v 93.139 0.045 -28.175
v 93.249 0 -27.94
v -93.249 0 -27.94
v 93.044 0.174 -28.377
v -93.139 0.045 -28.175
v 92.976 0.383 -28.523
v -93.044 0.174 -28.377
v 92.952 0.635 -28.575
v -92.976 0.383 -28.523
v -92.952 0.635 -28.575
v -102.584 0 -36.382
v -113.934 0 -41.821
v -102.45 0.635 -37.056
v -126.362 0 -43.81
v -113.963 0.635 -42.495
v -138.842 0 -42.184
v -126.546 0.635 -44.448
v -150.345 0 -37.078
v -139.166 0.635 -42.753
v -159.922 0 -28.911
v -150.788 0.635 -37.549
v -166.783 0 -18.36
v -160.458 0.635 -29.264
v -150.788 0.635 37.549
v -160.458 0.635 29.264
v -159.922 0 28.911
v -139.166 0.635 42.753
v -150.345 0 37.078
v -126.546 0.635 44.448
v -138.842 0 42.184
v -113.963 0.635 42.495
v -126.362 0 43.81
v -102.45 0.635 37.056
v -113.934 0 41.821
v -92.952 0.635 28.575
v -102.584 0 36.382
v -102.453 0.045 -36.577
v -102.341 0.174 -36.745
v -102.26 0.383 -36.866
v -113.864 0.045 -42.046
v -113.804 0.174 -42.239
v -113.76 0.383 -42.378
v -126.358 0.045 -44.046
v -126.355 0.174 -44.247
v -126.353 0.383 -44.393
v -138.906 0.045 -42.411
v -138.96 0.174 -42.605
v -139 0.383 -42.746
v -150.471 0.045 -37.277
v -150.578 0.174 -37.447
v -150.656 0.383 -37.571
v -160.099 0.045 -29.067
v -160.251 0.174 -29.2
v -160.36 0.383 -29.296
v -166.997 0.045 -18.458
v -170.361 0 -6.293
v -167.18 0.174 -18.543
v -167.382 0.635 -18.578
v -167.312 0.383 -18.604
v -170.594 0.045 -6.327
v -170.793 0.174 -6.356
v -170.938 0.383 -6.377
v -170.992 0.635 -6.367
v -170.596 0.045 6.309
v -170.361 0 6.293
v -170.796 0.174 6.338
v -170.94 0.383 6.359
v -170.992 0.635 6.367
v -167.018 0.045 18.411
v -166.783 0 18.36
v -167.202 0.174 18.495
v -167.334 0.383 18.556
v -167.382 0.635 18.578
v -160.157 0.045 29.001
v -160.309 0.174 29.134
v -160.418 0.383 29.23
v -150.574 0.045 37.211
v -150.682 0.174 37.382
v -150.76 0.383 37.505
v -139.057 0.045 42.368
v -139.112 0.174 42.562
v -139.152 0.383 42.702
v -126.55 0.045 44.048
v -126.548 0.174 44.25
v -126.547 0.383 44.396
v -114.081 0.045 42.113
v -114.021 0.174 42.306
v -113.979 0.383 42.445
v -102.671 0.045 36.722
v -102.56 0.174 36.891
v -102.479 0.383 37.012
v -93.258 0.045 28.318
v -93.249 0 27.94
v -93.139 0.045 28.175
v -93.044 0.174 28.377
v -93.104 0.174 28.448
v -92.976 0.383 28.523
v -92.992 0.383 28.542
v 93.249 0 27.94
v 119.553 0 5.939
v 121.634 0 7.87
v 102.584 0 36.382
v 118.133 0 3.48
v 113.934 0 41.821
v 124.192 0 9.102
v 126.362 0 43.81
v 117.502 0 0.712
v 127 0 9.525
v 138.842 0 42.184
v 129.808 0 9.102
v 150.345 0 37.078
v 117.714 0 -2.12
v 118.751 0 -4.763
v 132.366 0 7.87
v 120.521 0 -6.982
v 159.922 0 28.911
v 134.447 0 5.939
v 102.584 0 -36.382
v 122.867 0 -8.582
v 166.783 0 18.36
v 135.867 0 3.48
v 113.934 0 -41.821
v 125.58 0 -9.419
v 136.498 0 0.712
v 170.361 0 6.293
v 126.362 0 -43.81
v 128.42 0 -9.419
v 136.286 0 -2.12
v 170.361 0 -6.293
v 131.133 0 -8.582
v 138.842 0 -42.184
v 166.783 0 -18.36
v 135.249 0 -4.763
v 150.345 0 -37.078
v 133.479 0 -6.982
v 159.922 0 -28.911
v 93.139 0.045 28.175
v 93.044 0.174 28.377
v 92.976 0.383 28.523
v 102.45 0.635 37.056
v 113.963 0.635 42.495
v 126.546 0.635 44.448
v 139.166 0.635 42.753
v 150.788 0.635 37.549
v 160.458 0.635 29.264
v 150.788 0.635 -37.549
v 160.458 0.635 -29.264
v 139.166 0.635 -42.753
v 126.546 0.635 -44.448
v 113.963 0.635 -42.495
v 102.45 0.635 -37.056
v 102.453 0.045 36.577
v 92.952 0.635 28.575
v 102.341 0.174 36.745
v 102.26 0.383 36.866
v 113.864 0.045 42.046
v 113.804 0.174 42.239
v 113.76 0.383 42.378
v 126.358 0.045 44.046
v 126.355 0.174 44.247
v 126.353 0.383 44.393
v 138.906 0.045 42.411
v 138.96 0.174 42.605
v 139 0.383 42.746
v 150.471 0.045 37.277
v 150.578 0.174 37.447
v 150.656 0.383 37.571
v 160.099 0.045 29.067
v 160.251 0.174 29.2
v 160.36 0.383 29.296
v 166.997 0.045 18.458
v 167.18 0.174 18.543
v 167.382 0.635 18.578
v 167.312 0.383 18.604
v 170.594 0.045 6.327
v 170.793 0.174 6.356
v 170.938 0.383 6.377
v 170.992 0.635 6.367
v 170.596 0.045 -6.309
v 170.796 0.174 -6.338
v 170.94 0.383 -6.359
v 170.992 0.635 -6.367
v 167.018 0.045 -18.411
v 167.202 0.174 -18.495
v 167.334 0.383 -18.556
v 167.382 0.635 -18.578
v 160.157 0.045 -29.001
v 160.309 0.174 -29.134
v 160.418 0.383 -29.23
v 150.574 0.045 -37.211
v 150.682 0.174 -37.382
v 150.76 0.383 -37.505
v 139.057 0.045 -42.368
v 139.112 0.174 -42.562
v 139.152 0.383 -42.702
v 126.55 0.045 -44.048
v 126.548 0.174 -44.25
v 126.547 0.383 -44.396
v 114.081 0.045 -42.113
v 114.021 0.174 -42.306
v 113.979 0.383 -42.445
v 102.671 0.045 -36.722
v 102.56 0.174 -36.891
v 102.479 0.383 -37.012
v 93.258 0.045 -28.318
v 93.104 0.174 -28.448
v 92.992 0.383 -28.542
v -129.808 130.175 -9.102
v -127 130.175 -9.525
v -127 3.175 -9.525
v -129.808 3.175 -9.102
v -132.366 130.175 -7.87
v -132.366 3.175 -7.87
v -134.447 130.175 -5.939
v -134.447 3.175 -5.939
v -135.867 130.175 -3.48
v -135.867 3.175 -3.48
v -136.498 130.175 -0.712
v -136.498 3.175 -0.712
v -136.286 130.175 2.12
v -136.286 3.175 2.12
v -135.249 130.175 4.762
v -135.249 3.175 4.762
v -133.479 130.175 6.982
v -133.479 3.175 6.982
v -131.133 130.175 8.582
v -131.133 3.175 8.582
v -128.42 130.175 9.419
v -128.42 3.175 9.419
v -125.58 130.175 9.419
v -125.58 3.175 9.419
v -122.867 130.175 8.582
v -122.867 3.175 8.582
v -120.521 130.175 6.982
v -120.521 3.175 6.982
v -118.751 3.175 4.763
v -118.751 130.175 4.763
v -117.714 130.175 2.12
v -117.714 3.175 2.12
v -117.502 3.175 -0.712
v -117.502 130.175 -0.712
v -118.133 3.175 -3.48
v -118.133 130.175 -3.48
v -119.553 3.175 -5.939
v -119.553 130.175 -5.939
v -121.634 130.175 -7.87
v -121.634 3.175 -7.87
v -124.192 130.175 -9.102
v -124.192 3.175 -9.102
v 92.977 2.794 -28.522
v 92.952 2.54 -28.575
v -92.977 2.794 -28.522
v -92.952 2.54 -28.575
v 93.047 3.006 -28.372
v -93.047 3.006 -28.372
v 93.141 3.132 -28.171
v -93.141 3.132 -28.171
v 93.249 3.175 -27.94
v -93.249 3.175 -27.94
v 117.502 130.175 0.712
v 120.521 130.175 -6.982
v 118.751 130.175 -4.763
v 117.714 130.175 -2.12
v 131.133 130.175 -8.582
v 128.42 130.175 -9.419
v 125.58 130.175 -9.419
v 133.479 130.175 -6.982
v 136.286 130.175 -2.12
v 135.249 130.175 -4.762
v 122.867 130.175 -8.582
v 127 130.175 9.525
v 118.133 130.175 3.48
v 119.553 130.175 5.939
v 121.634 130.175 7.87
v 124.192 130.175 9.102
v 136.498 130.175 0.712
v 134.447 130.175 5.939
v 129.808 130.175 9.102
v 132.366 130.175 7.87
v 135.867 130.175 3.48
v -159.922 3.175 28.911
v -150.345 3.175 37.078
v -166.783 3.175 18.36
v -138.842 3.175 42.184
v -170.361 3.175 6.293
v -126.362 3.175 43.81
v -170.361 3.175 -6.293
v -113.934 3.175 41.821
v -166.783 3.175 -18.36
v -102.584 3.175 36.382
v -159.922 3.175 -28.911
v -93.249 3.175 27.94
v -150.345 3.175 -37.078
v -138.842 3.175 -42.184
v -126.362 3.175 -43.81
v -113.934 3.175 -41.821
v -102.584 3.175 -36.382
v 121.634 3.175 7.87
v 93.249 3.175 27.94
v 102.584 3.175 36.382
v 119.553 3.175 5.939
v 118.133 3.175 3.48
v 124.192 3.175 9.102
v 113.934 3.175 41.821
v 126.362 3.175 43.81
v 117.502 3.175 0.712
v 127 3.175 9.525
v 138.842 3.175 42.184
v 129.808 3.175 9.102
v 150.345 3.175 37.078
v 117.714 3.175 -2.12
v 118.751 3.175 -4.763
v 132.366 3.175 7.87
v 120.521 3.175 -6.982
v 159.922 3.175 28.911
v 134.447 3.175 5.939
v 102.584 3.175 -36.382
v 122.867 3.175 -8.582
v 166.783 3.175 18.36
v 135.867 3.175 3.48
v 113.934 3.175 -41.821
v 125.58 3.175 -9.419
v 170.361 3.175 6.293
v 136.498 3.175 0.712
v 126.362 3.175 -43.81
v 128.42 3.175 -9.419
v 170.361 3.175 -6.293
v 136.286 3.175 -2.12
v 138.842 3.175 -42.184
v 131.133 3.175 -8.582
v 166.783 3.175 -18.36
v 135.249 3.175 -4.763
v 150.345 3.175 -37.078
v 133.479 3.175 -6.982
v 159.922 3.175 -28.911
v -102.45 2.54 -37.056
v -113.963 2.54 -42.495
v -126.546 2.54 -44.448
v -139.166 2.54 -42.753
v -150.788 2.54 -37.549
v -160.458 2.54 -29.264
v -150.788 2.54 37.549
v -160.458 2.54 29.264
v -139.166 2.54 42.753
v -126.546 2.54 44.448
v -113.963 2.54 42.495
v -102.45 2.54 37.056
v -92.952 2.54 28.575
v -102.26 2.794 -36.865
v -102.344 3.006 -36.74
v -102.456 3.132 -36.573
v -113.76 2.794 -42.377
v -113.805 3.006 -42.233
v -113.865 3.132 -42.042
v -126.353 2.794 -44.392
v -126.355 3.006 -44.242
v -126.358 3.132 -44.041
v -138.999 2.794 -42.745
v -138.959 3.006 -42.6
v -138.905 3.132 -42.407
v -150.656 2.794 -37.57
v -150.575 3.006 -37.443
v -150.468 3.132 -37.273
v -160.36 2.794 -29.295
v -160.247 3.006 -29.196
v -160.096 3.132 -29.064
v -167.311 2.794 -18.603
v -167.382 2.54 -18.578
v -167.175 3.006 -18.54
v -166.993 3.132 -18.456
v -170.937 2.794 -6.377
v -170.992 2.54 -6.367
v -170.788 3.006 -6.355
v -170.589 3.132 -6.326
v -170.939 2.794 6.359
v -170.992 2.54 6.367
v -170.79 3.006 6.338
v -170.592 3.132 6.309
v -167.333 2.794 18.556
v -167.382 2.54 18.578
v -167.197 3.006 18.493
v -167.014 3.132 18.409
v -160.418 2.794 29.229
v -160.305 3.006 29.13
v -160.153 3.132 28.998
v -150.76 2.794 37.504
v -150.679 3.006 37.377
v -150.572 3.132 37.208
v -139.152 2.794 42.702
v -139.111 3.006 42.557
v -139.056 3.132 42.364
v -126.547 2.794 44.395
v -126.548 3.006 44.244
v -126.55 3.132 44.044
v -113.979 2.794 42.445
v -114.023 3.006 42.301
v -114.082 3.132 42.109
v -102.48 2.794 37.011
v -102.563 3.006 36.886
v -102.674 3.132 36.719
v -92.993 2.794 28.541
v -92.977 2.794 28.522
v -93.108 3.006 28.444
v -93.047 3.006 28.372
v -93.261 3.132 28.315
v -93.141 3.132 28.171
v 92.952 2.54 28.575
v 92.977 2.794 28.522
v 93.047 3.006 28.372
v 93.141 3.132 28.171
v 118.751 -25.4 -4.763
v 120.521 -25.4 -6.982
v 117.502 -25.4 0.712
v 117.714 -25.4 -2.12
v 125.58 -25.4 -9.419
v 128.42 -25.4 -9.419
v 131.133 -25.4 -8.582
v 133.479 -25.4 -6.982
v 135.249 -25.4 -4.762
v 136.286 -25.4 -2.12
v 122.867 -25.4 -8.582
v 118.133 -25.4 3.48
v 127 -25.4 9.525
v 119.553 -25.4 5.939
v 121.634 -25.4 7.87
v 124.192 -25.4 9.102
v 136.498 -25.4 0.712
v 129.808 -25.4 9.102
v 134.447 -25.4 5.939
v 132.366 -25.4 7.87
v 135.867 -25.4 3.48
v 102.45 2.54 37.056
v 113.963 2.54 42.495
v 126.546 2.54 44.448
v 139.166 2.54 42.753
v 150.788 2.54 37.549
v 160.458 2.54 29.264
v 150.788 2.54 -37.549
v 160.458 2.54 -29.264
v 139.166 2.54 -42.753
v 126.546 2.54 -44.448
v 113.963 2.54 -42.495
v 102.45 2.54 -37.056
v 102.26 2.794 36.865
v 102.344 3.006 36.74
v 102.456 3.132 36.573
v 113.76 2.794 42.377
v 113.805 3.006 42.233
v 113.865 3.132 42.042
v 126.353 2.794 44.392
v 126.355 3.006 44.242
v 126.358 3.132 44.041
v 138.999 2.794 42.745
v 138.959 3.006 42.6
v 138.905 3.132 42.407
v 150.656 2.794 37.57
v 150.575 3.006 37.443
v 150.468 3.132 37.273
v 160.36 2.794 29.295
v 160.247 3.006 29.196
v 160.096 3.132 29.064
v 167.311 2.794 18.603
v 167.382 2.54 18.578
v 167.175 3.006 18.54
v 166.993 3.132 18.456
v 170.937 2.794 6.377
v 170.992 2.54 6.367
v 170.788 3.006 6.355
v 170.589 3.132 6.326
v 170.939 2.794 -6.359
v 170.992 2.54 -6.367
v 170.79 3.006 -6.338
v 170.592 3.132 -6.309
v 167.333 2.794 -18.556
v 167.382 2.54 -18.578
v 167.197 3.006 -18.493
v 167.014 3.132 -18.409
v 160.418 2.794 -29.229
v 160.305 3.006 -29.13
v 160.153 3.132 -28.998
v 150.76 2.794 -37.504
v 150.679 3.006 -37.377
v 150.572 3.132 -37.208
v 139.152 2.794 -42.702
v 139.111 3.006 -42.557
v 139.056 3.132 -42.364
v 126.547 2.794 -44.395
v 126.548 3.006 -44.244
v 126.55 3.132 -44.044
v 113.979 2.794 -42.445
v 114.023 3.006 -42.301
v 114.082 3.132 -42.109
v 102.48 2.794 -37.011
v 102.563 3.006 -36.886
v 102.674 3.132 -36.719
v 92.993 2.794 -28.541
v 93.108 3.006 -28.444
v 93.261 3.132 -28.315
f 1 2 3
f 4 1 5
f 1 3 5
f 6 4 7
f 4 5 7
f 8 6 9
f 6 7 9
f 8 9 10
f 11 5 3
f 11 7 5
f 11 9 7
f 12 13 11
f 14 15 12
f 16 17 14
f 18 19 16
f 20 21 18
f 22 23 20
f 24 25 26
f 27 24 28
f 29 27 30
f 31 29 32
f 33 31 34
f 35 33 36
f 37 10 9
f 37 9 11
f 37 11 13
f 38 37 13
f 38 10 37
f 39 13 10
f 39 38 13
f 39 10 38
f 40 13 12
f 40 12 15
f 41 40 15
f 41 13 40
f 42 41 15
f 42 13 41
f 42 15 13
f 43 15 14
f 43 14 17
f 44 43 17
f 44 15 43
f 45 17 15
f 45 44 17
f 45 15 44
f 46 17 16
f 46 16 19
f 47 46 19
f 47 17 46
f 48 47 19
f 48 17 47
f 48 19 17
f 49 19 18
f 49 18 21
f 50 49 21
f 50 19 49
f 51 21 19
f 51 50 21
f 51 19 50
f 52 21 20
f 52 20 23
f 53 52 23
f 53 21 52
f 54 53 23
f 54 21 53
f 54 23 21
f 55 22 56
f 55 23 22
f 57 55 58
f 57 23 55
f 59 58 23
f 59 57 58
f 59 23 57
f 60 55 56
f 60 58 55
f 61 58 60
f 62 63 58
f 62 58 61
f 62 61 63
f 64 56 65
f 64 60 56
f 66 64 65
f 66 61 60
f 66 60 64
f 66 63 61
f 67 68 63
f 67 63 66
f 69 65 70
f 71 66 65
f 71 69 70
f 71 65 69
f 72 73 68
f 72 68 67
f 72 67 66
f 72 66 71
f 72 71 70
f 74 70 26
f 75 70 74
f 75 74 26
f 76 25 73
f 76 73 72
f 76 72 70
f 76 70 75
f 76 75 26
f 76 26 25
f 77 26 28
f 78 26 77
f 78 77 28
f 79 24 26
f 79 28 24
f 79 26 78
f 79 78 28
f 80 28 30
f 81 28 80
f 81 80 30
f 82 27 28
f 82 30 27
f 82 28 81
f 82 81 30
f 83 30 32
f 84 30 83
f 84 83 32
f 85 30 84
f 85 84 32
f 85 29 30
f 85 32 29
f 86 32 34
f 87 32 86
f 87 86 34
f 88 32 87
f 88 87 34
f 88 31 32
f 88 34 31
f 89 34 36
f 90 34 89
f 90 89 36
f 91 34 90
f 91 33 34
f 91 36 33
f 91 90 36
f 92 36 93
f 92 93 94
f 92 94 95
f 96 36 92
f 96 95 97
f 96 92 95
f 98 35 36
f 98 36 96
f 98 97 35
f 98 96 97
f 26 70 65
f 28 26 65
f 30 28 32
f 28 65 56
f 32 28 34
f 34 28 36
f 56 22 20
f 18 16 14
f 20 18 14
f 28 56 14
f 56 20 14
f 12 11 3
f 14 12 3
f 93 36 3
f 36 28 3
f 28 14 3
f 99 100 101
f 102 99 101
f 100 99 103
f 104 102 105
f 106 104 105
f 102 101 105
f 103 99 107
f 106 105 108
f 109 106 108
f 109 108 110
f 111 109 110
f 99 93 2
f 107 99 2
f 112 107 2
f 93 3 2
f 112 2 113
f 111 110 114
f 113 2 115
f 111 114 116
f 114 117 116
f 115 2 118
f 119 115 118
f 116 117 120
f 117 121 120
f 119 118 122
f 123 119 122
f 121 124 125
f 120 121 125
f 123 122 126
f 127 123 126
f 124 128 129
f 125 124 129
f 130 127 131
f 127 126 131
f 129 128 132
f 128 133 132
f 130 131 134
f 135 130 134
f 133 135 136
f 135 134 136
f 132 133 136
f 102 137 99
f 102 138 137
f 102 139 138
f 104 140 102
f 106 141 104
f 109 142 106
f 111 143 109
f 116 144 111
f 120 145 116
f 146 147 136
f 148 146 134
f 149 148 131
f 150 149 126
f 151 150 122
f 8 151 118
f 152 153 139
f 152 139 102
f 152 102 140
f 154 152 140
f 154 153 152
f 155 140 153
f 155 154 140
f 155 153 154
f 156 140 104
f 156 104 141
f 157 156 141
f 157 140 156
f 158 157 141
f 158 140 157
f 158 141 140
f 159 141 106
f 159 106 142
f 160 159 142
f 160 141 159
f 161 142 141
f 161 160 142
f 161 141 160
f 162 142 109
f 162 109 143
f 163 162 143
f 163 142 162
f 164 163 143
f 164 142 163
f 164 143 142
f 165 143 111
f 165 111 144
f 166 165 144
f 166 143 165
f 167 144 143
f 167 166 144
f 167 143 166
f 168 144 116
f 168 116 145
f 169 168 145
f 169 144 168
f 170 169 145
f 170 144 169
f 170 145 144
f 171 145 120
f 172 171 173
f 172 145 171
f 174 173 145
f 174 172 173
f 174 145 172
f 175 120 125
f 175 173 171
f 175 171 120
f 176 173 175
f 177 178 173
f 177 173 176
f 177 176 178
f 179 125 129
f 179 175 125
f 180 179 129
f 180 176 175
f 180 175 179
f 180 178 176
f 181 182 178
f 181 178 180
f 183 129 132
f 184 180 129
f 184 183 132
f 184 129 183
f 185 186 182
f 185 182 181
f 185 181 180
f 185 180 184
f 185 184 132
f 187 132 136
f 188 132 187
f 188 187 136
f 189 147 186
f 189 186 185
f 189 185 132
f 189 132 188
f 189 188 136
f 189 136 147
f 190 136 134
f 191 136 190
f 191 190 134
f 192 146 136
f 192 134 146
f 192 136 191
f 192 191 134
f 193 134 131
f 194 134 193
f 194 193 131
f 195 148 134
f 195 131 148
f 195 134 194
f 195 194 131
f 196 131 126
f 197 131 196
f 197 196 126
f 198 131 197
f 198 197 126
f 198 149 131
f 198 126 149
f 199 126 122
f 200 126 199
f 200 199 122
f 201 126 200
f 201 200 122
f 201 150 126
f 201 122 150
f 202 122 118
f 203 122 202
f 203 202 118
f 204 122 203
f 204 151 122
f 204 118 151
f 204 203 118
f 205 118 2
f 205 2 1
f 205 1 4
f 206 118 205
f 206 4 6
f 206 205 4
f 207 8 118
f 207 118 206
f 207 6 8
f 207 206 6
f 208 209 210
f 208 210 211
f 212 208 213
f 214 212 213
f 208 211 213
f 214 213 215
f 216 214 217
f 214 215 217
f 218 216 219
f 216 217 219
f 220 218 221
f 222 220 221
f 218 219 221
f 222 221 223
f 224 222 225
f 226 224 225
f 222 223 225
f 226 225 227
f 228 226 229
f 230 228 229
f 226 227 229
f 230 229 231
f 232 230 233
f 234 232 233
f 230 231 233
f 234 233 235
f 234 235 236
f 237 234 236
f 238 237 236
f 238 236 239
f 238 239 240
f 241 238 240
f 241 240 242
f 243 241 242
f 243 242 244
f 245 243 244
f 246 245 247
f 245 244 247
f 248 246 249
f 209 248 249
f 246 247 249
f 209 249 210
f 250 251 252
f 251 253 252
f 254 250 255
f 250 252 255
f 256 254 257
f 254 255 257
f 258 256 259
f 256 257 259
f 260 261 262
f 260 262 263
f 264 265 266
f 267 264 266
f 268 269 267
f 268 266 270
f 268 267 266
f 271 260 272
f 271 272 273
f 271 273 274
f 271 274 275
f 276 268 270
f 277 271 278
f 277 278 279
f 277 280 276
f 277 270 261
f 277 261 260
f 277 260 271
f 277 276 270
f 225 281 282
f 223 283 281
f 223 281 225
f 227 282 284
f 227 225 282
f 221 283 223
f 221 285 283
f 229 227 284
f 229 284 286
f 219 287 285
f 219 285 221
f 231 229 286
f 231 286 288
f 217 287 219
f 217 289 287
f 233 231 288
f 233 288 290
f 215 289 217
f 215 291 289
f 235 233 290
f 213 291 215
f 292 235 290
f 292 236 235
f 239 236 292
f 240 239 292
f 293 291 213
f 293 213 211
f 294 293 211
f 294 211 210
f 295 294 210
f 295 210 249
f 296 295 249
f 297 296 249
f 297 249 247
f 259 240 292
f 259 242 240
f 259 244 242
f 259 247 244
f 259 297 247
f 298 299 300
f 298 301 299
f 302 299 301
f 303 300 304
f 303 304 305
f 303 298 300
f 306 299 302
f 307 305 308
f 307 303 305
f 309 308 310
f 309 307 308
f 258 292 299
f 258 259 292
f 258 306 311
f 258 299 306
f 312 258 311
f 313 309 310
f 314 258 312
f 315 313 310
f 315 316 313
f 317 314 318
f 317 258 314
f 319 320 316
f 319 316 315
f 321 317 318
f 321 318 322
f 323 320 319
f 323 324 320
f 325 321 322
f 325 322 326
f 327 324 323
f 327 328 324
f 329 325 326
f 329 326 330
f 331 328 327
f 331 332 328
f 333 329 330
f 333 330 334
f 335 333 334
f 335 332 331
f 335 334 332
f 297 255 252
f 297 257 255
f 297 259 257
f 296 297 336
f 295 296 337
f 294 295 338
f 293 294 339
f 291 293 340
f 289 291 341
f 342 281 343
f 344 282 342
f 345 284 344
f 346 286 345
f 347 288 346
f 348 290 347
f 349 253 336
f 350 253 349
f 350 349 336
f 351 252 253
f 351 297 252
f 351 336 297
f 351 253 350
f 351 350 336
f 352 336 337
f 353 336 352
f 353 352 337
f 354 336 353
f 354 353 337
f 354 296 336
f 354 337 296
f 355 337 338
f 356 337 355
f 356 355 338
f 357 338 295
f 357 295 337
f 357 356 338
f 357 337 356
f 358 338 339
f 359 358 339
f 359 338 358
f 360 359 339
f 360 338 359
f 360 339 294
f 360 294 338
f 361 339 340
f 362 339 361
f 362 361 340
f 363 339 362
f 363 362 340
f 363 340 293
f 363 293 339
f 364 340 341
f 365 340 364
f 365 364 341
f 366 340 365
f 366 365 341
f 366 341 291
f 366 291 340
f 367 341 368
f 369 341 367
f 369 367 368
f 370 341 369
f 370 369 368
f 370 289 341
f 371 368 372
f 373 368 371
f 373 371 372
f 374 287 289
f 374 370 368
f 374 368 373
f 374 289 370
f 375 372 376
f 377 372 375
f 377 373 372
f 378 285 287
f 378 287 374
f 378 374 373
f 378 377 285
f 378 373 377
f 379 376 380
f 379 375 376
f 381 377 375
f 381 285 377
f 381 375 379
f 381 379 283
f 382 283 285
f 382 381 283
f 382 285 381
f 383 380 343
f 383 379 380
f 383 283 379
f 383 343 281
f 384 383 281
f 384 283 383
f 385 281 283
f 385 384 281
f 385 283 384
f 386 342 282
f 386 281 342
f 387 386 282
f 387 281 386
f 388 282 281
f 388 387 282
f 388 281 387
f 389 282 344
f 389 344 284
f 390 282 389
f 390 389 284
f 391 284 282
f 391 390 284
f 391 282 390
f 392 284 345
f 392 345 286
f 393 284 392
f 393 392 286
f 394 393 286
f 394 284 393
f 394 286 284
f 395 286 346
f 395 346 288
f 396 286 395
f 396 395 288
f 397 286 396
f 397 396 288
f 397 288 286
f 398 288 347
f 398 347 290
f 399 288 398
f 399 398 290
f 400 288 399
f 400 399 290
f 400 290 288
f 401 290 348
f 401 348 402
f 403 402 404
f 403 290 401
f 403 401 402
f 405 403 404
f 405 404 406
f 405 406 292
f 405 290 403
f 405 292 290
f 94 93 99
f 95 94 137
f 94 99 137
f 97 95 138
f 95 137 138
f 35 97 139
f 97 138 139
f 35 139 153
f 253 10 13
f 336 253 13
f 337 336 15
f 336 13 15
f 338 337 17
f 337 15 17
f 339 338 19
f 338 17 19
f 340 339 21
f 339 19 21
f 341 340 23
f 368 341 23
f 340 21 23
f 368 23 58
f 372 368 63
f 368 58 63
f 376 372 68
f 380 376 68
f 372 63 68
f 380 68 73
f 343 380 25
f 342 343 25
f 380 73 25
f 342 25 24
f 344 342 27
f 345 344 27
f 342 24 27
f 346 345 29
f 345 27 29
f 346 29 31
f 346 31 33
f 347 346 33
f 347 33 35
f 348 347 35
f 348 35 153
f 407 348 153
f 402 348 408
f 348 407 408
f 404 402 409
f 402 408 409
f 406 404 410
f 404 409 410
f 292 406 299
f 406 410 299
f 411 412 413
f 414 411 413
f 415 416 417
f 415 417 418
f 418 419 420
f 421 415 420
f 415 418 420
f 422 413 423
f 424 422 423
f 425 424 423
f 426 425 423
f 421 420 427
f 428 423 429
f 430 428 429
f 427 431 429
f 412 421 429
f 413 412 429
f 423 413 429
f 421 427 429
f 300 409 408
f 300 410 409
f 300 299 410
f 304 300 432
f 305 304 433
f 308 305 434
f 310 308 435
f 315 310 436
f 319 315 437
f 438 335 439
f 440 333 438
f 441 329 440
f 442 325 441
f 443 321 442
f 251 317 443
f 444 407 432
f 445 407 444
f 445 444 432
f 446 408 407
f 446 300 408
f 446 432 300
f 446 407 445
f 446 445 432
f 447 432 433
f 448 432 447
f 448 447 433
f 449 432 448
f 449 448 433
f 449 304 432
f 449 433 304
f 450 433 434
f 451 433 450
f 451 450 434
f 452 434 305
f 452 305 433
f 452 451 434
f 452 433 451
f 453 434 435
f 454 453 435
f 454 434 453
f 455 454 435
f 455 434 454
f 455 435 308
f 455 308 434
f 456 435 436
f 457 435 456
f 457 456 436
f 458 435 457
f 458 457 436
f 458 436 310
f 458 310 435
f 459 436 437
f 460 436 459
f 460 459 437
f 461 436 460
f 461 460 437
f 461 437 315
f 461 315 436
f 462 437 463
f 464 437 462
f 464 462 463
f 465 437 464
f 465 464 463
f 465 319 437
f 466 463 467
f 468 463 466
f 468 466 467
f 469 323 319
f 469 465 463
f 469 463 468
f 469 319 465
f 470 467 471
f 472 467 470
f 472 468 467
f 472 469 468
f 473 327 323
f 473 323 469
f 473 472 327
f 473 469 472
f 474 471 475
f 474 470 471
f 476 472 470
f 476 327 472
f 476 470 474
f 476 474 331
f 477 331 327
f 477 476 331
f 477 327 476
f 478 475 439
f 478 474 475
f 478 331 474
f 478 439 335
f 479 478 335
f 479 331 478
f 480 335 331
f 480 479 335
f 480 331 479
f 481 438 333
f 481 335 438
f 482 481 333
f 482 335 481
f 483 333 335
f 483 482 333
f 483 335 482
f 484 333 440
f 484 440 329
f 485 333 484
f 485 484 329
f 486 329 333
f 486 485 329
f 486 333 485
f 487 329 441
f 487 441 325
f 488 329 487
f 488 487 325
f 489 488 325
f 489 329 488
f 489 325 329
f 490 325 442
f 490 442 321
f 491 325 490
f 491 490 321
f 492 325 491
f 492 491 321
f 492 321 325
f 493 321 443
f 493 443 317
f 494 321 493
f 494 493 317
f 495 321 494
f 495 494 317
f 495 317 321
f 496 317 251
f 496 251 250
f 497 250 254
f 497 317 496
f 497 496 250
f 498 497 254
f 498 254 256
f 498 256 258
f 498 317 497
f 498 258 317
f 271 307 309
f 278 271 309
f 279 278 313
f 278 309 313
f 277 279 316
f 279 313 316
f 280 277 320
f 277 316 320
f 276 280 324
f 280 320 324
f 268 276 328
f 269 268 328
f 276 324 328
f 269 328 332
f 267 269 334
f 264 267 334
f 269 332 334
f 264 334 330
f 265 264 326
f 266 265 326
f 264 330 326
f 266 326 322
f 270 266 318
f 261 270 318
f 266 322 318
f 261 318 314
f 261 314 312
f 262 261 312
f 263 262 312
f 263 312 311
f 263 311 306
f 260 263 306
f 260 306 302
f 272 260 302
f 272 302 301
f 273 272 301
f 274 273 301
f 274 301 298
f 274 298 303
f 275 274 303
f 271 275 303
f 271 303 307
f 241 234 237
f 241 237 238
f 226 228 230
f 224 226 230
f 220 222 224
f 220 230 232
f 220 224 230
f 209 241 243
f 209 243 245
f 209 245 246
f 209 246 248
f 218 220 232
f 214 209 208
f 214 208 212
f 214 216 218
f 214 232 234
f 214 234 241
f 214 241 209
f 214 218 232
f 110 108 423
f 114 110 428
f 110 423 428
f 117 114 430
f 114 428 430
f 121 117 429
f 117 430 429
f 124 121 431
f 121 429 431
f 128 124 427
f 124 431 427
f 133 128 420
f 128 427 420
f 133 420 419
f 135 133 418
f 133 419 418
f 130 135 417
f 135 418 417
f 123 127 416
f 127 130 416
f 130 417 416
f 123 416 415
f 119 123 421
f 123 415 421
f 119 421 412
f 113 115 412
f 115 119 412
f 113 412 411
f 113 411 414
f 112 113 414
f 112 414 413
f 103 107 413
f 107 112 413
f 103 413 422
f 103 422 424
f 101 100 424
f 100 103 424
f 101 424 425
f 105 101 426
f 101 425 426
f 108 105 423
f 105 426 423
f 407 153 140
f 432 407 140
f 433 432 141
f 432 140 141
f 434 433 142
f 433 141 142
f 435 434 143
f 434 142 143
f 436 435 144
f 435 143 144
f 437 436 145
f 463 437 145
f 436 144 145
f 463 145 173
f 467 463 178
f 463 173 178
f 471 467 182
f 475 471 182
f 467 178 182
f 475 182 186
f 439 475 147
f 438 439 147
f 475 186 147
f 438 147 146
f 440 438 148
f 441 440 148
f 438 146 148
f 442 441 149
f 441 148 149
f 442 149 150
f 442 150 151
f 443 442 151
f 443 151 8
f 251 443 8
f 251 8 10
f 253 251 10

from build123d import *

# Parameters (mm, degrees)
BOSS_EXTRUDE1_DEPTH      = 3.175
SKETCH2_R                = 9.525
BOSS_EXTRUDE2_DEPTH      = 127
BOSS_EXTRUDE3_DEPTH      = 127
BOSS_EXTRUDE3_DEPTH_BACK = 28.575
SKETCH4_R                = 9.525
FILLET3_R                = 0.635


with BuildPart() as part:
    # Sketch1 → Boss-Extrude1 (new body)
    with BuildSketch(Plane(origin=(0, 0, 0), x_dir=(1, 0, 0), z_dir=(0, 1, 0))):
        with BuildLine():
            Line((92.951918189, 28.575), (-92.951918189, 28.575))
            ThreePointArc((-92.951918189, 28.575), (-171.45, 0), (-92.951918189, -28.575))
            Line((-92.951918189, -28.575), (92.951918189, -28.575))
            ThreePointArc((92.951918189, -28.575), (171.45, 0), (92.951918189, 28.575))
        make_face()
    extrude(amount=BOSS_EXTRUDE1_DEPTH)

    # Sketch2 → Boss-Extrude2 (add)
    with BuildSketch(Plane(origin=(0, 3.175, 0), x_dir=(1, 0, 0), z_dir=(0, 1, 0))):
        with Locations(Location((-127, 0, 0), (0, 0, 90))):
            Circle(SKETCH2_R)
    extrude(amount=BOSS_EXTRUDE2_DEPTH)

    # Sketch4 → Boss-Extrude3 (add, two sides: drawn at the far end of the back side and taken through both)
    with BuildSketch(Plane(origin=(0, 3.175, 0), x_dir=(1, 0, 0), z_dir=(0, 1, 0)).offset(-BOSS_EXTRUDE3_DEPTH_BACK)):
        with Locations(Location((127, 0, 0), (0, 0, 270))):
            Circle(SKETCH4_R)
    extrude(amount=BOSS_EXTRUDE3_DEPTH + BOSS_EXTRUDE3_DEPTH_BACK)

    # Fillet3
    fillet3_edges = [part.edges().sort_by_distance(p)[0] for p in [
        (171.45, 3.175, 0),
        (0, 3.175, -28.575),
        (-171.45, 3.175, 0),
        (0, 0, -28.575),
        (171.45, 0, 0),
        (0, 0, 28.575),
        (-171.45, 0, 0),
        (0, 3.175, 28.575),
    ]]
    fillet(fillet3_edges, radius=FILLET3_R)


solid = part.part
